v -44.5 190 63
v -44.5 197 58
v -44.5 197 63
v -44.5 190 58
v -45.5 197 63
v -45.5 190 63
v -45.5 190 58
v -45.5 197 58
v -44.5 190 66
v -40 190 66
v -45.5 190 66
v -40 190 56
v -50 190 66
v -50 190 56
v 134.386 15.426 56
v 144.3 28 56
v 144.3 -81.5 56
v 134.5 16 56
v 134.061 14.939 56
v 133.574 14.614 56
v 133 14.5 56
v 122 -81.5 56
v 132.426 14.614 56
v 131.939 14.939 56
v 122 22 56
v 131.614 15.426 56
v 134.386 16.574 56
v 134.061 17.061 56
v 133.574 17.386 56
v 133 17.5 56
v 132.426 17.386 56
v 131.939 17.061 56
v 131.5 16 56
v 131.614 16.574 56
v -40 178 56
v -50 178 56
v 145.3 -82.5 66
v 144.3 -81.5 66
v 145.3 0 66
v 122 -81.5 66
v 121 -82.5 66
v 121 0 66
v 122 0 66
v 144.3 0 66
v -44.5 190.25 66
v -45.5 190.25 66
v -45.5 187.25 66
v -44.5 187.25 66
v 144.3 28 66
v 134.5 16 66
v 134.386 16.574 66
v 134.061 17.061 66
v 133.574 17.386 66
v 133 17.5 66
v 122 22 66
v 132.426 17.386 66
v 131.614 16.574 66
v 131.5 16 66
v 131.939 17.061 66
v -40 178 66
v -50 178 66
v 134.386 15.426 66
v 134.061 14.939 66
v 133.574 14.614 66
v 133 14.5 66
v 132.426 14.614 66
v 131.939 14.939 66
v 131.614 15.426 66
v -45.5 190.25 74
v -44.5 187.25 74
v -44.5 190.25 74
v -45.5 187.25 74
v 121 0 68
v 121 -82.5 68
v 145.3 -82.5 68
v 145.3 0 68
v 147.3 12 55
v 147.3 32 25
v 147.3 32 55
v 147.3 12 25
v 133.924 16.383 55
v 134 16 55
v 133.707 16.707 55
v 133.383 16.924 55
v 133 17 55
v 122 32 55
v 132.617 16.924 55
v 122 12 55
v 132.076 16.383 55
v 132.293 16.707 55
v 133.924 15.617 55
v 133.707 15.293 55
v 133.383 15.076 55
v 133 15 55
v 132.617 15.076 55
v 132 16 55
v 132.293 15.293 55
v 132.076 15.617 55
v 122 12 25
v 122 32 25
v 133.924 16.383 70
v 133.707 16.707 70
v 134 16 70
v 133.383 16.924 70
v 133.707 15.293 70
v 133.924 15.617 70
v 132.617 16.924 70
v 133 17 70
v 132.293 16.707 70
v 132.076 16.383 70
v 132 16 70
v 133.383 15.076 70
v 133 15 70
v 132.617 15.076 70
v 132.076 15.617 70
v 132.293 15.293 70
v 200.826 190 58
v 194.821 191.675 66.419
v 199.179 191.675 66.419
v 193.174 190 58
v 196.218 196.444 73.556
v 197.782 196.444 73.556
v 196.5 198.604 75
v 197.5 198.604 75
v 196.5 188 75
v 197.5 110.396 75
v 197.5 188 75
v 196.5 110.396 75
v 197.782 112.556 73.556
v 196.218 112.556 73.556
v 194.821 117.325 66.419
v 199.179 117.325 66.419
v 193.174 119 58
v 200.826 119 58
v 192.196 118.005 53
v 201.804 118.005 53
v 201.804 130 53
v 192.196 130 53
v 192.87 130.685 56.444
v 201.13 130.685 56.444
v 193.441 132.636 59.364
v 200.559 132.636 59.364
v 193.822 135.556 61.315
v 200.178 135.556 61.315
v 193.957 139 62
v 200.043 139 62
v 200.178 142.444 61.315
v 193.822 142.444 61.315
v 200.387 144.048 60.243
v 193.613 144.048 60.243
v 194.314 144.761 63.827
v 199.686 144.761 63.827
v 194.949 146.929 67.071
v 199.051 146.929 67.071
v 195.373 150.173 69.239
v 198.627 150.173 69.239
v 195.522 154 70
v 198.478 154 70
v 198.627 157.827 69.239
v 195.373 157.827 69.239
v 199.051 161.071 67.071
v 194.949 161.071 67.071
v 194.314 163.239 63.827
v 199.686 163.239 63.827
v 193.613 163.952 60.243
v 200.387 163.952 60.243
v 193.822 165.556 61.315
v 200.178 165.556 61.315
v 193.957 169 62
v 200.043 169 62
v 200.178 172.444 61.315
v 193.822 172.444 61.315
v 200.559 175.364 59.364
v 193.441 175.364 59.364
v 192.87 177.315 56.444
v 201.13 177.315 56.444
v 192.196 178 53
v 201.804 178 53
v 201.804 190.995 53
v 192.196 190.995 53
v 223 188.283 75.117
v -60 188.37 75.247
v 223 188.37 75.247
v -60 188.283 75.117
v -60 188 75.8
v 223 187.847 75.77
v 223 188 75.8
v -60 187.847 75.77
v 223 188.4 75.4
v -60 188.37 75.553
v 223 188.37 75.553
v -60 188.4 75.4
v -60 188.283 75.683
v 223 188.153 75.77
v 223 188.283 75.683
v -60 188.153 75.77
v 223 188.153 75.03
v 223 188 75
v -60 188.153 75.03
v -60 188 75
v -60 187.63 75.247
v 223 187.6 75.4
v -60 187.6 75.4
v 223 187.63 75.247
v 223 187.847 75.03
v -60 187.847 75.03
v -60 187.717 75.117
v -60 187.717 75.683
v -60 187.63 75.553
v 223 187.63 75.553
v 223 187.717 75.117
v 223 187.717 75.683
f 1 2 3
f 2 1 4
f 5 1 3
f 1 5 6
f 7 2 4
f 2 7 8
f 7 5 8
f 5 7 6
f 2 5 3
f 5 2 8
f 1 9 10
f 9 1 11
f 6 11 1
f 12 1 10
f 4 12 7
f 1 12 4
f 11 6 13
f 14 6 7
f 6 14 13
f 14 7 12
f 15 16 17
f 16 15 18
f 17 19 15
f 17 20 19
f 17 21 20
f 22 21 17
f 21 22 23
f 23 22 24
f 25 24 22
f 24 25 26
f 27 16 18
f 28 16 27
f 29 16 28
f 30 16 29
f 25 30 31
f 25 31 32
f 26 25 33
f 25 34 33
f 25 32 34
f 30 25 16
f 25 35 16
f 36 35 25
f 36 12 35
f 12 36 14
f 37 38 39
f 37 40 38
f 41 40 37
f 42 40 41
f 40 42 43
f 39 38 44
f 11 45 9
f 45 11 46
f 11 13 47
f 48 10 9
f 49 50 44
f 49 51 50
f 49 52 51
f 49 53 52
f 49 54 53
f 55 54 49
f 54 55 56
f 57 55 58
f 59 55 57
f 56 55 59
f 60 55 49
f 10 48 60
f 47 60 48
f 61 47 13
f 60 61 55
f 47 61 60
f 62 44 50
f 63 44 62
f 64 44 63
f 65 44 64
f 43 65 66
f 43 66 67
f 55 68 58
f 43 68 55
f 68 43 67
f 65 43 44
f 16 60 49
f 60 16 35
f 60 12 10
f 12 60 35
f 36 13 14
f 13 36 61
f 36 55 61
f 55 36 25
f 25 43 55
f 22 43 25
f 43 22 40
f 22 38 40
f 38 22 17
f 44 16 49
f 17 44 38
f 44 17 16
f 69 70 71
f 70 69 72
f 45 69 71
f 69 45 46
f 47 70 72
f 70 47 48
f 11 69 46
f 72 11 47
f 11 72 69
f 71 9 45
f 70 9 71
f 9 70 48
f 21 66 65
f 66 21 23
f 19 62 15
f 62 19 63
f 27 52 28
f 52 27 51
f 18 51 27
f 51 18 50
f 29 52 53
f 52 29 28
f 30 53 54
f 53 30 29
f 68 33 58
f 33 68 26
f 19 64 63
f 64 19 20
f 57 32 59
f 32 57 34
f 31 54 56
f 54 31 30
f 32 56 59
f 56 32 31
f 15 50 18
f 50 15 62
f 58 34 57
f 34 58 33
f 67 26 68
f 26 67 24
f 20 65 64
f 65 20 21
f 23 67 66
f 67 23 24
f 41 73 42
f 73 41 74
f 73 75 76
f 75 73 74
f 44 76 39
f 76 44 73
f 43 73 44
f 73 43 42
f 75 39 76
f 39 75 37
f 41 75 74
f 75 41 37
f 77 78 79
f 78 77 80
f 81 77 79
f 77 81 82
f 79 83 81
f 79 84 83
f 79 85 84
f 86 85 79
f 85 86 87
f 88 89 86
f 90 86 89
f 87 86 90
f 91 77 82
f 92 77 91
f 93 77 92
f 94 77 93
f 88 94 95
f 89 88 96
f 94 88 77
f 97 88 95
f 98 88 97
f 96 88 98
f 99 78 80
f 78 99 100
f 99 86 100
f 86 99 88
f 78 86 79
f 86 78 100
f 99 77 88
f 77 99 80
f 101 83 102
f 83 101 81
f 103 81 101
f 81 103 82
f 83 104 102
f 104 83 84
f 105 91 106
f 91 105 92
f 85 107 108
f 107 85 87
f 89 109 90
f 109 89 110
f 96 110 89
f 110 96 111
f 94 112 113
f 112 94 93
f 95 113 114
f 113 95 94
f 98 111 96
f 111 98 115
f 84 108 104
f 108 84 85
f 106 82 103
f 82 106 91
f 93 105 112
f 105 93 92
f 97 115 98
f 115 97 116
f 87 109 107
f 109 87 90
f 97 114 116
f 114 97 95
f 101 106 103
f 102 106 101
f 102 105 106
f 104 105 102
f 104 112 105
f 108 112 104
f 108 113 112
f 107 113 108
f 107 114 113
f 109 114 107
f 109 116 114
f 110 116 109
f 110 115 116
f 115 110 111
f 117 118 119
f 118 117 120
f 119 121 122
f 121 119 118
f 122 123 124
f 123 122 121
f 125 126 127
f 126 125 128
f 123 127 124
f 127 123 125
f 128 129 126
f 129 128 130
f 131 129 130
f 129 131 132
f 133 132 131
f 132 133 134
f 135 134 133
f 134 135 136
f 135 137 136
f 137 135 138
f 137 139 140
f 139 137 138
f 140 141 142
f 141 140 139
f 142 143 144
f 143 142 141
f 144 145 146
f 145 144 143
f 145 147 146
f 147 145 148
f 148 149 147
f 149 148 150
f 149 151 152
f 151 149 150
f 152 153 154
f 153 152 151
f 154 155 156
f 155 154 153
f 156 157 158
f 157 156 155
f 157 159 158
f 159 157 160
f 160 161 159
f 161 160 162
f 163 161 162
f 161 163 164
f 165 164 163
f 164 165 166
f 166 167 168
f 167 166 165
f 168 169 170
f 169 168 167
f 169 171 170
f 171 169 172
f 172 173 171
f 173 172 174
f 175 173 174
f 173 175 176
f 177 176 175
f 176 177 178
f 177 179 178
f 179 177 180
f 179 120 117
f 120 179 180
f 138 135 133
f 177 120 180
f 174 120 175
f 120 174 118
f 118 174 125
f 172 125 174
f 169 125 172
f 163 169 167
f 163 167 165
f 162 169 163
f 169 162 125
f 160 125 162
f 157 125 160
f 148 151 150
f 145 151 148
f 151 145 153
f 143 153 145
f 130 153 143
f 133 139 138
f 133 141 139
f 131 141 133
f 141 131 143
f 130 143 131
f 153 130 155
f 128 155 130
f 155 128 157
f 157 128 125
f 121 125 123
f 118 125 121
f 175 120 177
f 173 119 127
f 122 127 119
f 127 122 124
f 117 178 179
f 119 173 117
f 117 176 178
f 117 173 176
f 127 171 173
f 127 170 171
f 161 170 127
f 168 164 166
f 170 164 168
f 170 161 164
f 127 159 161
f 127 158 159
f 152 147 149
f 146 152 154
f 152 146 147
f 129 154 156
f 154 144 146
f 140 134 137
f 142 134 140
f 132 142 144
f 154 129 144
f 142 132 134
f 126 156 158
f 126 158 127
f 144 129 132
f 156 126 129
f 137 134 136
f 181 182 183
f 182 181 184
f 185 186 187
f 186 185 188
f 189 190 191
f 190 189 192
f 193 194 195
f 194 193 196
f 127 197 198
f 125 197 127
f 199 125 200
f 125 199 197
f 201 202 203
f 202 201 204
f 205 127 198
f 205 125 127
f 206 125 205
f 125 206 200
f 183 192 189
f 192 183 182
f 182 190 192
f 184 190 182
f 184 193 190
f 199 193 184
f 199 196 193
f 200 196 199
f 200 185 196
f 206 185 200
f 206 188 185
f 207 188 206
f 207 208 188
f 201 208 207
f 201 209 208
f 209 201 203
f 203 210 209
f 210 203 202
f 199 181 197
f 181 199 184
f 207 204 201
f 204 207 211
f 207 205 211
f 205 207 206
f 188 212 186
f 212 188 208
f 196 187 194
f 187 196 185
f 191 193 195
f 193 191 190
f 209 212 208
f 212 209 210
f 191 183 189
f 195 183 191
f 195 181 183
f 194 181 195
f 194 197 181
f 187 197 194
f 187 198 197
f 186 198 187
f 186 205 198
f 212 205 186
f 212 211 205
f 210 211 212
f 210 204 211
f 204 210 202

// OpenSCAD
// Simple diagram of a clavichord action for educational purposes, showing the
// key levever, balance pin, tangent, and string.
// Each part ("key lever", "balance pin", "tangent", and "string") has a text label next to it.


/* [Number of keys/strings/pins] */
// Number of keys
num_keys = 1;
// Number of strings
num_strings = 1;

/* [Slot Positions and Sounding Lengths] */
// Array of the format [slot_position, sounding_length], indexed by key_idx, both relative to the bridge.
// e.g. 11th entry is [564.5, 565], which says the slot for the f# key is 564.5mm to the left of the bridge, and the sounding length is 565mm.
note_slot_position_and_sounding_length = [
    [237.0, 237.0], // F
];

/* [Case Dimensions (mm-R)] */
// Case length
c_length = 405;
// Case width
c_width = 216;
// Case height
c_height = 82;
// Wall thickness
wall_th = 12;
right_edge_x = c_length - wall_th;

/* [Internal Component Dimensions (mm-R)] */
// Hitchpin block thickness (?)
hitchpin_block_th = 13;
// Hitchpin block height (?)
hitchpin_block_height = 60;
// Rack thickness
rack_th = 13;
// Rack width (?)
rack_width = 836;
// Rack height (?)
rack_height = 30;
// Rack starting position (XYZ) (?)
rack_pos = [
    wall_th + hitchpin_block_th,
    c_width - wall_th - rack_th,
    c_height - rack_height - wall_th
];
// Balance rail height (?)
balance_rail_height = 30;
// Balance rail depth (?)
balance_rail_depth = 20;
// Slot width (?)
slot_width = 1.5;

/* [Soundbox Dimensions (mm-R)] */
// Bridge width
bridge_width = 98;
// Bridge height
bridge_height = 22;
// Bridge top depth (?)
bridge_top_depth = 1;
// Bridge bottom depth
bridge_bottom_depth = 10;
// Soundboard height (?)
soundboard_height = 3;
// Soundboard position
soundboard_pos = [
    wall_th + hitchpin_block_th + 150,
    wall_th,
    50
];
// Bridge position
bridge_pos = [
    right_edge_x - 201,
    c_width - wall_th - rack_th - 82,
    soundboard_pos.z + soundboard_height
];
// Mousehole height (?)
mousehole_height = 100;
// Mousehole radius (?)
mousehole_radius = 30;

/* [String/Pin Dimensions (mm-R)] */
// Hitchpin height (?)
hitchpin_height = 5;
// Hitchpin radius (?)
hitchpin_radius = 1;
// Balance pin height (?)
balance_pin_height = 15;
// Balance pin radius (?)
balance_pin_radius = 1;
// Tuning pin height (?)
tuning_pin_height = 23;
// Tuning pin radius (?)
tuning_pin_radius = 1.5;
// String radius (?)
string_radius = 0.4;

/* [Keyboard Dimensions (mm-R)] */
// Natural key width
nat_width = 25.3;
// Natural key depth
nat_depth = 81.5;
// Natural key height
nat_height = 10;
// Key top height (?)
key_top_height = 2;
// Sharp key width
sharp_width = 14.3;
// Sharp key depth
sharp_depth = 41.2;
// Sharp key height
sharp_height = 4.9;
// Tangent striking width (?)
tangent_width = 3;
// Tangent depth (?)
tangent_depth = 1;
// Tangent height (?)
tangent_height = 8;
// Rack tongue width (?)
rack_tongue_width = 1;
// Rack tongue depth (?)
rack_tongue_depth = 7;
// Rack tongue height (?)
rack_tongue_height = 5;
// Keyboard start position
kb_pos = [
    122,
    -nat_depth,
    c_height - nat_height - 16
];
// Keyboard total length
kb_length = key_x(num_keys + 1) - kb_pos.x;
// y coordinate of top of each key lever (?)
key_lever_top_y = c_width - wall_th - rack_th - 1;

/* [Colors (RGB)] */
// Dark wood
col_wood_dark = [0.35, 0.20, 0.10];
// Light wood
col_wood_light = [0.80, 0.65, 0.40];
// Medium wood
col_wood_med = [0.55, 0.35, 0.15];
// Key lever
col_key_lever = [0.9, 0.9, 0.9];
// Natural key top
col_natural = [0.90, 0.88, 0.80];
// Sharp key top
col_sharp = [0.15, 0.15, 0.15];
// Brass
col_brass = [0.85, 0.75, 0.30];
// String
col_string = [0.90, 0.90, 0.90];
// Iron
col_iron = [0.37, 0.4, 0.41];

/* [Advanced] */
$fn = 16;
// Debugging: dump out values of each function for every key/string
debug_mode = false;

// -- Helper functions ---

// Return y position for given string.
// Group strings in groups of 4, except bottom 2 and top 4.
function string_y(string_idx) =
    key_lever_top_y
    - 2
    - (string_idx*1.5)
    - floor(string_idx/4) * 1.5
    - (string_idx > 1 ? 3 : 0);

// Return x position for the tuning pin connected to the given string
function tuning_pin_x(string_idx) =
    right_edge_x
    - 170
    - (string_idx % 4) * 5;

// Return x position for the hitch pin connected to the given string
function hitch_pin_x(string_idx) = -60;

// Return string_idx of the first string that the tangent for the given key should strike.
// https://oeis.org/A057356
function key_string_idx(key_idx) =
    num_strings - 1
    - 2*(
        key_idx < 5
        ? key_idx
        : floor(2*(key_idx-1)/7) + 4
    );

// Return index of the closest (to the left) natural key for the given key
// https://oeis.org/A366701
function nat_idx(key_idx) = key_idx > 1
    ? (
        round(
            (key_idx)
            * log(3/2)/log(2)
        )
    )
    : key_idx;

// Return x position of slot for given key
function slot_x(key_idx) = bridge_pos.x - note_slot_position_and_sounding_length[key_idx][0];

// Return x position of tangent for given key
function tangent_x(key_idx) = bridge_pos.x - note_slot_position_and_sounding_length[key_idx][1] + tangent_depth/2;

// Return true if given key is a sharp, false if not
function is_sharp(key_idx) =
    key_idx > 0
    && key_idx < num_keys-1
    && nat_idx(key_idx) == nat_idx(key_idx-1);

// Return x position for the given key
function key_x(key_idx) =
    kb_pos.x
    + nat_idx(key_idx) * nat_width
    + (is_sharp(key_idx) ? nat_width - floor(sharp_width/2) : 0);

// --- Modules ---

module case() {
    color(col_wood_med)
    difference() {
        // Main outer block
        cube([c_length, c_width, c_height]);

        // Hollow interior
        translate([wall_th, wall_th, wall_th])
            cube([
                c_length - 2*wall_th,
                c_width - 2*wall_th,
                c_height
            ]);

        // Keyboard cutout in the front wall
        translate([kb_pos.x, -1, kb_pos.z])
            cube([
                kb_length,
                wall_th + 2,
                nat_height + key_top_height
            ]);
    }
}

module hitchpins() {
    for (string_idx=[0:num_strings-1])
        translate([
            hitch_pin_x(string_idx),
            string_y(string_idx),
            c_height - 10
        ])
            color(col_iron)
            cylinder(h=hitchpin_height, r=hitchpin_radius);
}

module hitchpin_block() {
    translate([
        wall_th,
        wall_th,
        c_height - hitchpin_block_height - 10
    ])
        color(col_wood_dark)
        cube([
            hitchpin_block_th,
            c_width - 2*wall_th,
            hitchpin_block_height
        ]);
}

module rack_slot_cutouts() {
   for (key_idx=[0:num_keys - 1])
        translate(rack_pos)
            translate([slot_x(key_idx) - rack_pos.x - slot_width/2, -1, 0])
                cube([slot_width, rack_th - 2, rack_height+1]);
}

module rack_block() {
    translate(rack_pos)
        cube([rack_width, rack_th, rack_height]);
}

module rack() {
    color(col_wood_dark)
    difference() {
        rack_block();
        rack_slot_cutouts();
    }
}

module balance_rail() {
    translate([
        kb_pos.x,
        wall_th,
        kb_pos.z - balance_rail_height - 1
    ])
        color(col_wood_dark)
        cube([kb_length, balance_rail_depth, balance_rail_height]);

    for(key_idx=[0:num_keys - 1])
        balance_pin(key_idx, balance_pin_radius);
}

module bridge() {
    translate(bridge_pos)
        rotate([90, 0, 90])
        color(col_wood_dark)
        intersection() {
            linear_extrude(100)
                bridge_2d();
            bridge_taper();
        }
}

module bridge_2d() {
    difference() {
        square([bridge_width, bridge_height]);
        translate([-12, 5, 0])
            circle(bridge_height);
        translate([30, 0, 0])
            circle(9);
        translate([45, 7, 0])
            circle(10);
        translate([60, 0, 0])
            circle(9);
        translate([bridge_width+5, 5, 0])
            circle(bridge_height);
    };
}

// Long trapezoid to intersect with the bridge so it tapers to top
module bridge_taper() {
    translate([
        c_length/2,
        bridge_height,
        bridge_bottom_depth/2
    ])
        rotate([180, 90, 0])
        linear_extrude(c_length)
            polygon([
                [-bridge_top_depth/2, 0],
                [-bridge_bottom_depth/2, bridge_height+1],
                [bridge_bottom_depth/2, bridge_height+1],
                [bridge_top_depth/2, 0],
            ]);
    }

module strings() {
    for (string_idx=[0:num_strings-1])
        translate([
            hitch_pin_x(string_idx),
            string_y(string_idx),
            soundboard_pos.z + soundboard_height + bridge_height + string_radius
        ])
            rotate([0, 90, 0])
            color(col_string)
            cylinder(
                h=tuning_pin_x(string_idx) - hitch_pin_x(string_idx),
                r=string_radius
            );
}

module balance_pin(key_idx, radius) {
    translate([
        key_x(key_idx) + floor((is_sharp(key_idx) ? sharp_width : nat_width)/2) - 1,
        wall_th + 4 + (is_sharp(key_idx) ? 10 : 0),
        kb_pos.z - 1
    ])
        color(col_iron)
        cylinder(h=balance_pin_height, r=radius);
}

module tangent(key_idx) {
    translate([
        tangent_x(key_idx),
        string_y(key_string_idx(key_idx)) - tangent_width / 4,
        kb_pos.z + nat_height
    ])
        color(col_brass)
        rotate([0, 0, 90])
        // This clavichord uses staple-like tangents
        difference() {
            cube([tangent_width, tangent_depth, tangent_height]);
        }

}

module rack_tongue(key_idx) {
    translate([
        slot_x(key_idx) - rack_tongue_width/2,
        key_lever_top_y,
        kb_pos.z + 2
    ])
        cube([rack_tongue_width, rack_tongue_depth, rack_tongue_height]);
}

// 2d polygon for the key lever, which will be extruded.
// This is a mess because I couldn't figue out an underlying pattern in how the keys are cranked.
module key_lever_2d(key_idx) {
    top_width = key_idx > 38 ? 5 : 10;
    bottom_width = (is_sharp(key_idx) ? sharp_width : nat_width) - 3;
    top = [
        slot_x(key_idx) - top_width/2,
        key_lever_top_y
    ];
    bottom = [
        key_x(key_idx),
        kb_pos.y + (is_sharp(key_idx) ? 45 : 0)
    ];
    second_bend_y = string_y(key_string_idx(key_idx)) - 10;
    first_bend_y = wall_th + 10 + (key_idx < 9 ? key_idx * 10 : max(80 - ((key_idx-10)*5), 0));

    polygon([
       // Bottom to first bend
       bottom,
       [bottom.x, first_bend_y],
       // Second bend to top
       [top.x, second_bend_y],
       top,
       // Top to second bend
       [top.x + top_width, top.y],
       [top.x + top_width, second_bend_y],
       // Second bend to first bend
       [bottom.x + bottom_width, first_bend_y + (key_idx < 9 ? 6 : -6)],
       [bottom.x + bottom_width, bottom.y],
    ]);
}

module key_lever_3d(key_idx) {
    color(col_key_lever) {
        rack_tongue(key_idx);
        translate([0, 0, kb_pos.z])
            linear_extrude(nat_height)
                difference() {
                    key_lever_2d(key_idx);
                    // Subtract neighboring keys so they don't overlap
                    if (!is_sharp(key_idx)) {
                        if(key_idx > 0) offset(delta=1) key_lever_2d(key_idx-1);
                        if (key_idx < num_keys - 1) offset(delta=1) key_lever_2d(key_idx+1);
                    }
                };
    }
    tangent(key_idx);
}

module natural_key_top(key_idx) {
    translate([
        key_x(key_idx) - 1,
        kb_pos.y - 1,
        kb_pos.z + nat_height
    ])
        color(col_natural)
        linear_extrude(key_top_height)
            square([nat_width - 1, -kb_pos.y + 1]);
}

module key(key_idx) {
    difference() {
        key_lever_3d(key_idx);
        balance_pin(key_idx, balance_pin_radius + 0.5);
    }
    natural_key_top(key_idx);
}

module assembly() {
    key(0);
    balance_rail();
    bridge();
    strings();
}

assembly();
